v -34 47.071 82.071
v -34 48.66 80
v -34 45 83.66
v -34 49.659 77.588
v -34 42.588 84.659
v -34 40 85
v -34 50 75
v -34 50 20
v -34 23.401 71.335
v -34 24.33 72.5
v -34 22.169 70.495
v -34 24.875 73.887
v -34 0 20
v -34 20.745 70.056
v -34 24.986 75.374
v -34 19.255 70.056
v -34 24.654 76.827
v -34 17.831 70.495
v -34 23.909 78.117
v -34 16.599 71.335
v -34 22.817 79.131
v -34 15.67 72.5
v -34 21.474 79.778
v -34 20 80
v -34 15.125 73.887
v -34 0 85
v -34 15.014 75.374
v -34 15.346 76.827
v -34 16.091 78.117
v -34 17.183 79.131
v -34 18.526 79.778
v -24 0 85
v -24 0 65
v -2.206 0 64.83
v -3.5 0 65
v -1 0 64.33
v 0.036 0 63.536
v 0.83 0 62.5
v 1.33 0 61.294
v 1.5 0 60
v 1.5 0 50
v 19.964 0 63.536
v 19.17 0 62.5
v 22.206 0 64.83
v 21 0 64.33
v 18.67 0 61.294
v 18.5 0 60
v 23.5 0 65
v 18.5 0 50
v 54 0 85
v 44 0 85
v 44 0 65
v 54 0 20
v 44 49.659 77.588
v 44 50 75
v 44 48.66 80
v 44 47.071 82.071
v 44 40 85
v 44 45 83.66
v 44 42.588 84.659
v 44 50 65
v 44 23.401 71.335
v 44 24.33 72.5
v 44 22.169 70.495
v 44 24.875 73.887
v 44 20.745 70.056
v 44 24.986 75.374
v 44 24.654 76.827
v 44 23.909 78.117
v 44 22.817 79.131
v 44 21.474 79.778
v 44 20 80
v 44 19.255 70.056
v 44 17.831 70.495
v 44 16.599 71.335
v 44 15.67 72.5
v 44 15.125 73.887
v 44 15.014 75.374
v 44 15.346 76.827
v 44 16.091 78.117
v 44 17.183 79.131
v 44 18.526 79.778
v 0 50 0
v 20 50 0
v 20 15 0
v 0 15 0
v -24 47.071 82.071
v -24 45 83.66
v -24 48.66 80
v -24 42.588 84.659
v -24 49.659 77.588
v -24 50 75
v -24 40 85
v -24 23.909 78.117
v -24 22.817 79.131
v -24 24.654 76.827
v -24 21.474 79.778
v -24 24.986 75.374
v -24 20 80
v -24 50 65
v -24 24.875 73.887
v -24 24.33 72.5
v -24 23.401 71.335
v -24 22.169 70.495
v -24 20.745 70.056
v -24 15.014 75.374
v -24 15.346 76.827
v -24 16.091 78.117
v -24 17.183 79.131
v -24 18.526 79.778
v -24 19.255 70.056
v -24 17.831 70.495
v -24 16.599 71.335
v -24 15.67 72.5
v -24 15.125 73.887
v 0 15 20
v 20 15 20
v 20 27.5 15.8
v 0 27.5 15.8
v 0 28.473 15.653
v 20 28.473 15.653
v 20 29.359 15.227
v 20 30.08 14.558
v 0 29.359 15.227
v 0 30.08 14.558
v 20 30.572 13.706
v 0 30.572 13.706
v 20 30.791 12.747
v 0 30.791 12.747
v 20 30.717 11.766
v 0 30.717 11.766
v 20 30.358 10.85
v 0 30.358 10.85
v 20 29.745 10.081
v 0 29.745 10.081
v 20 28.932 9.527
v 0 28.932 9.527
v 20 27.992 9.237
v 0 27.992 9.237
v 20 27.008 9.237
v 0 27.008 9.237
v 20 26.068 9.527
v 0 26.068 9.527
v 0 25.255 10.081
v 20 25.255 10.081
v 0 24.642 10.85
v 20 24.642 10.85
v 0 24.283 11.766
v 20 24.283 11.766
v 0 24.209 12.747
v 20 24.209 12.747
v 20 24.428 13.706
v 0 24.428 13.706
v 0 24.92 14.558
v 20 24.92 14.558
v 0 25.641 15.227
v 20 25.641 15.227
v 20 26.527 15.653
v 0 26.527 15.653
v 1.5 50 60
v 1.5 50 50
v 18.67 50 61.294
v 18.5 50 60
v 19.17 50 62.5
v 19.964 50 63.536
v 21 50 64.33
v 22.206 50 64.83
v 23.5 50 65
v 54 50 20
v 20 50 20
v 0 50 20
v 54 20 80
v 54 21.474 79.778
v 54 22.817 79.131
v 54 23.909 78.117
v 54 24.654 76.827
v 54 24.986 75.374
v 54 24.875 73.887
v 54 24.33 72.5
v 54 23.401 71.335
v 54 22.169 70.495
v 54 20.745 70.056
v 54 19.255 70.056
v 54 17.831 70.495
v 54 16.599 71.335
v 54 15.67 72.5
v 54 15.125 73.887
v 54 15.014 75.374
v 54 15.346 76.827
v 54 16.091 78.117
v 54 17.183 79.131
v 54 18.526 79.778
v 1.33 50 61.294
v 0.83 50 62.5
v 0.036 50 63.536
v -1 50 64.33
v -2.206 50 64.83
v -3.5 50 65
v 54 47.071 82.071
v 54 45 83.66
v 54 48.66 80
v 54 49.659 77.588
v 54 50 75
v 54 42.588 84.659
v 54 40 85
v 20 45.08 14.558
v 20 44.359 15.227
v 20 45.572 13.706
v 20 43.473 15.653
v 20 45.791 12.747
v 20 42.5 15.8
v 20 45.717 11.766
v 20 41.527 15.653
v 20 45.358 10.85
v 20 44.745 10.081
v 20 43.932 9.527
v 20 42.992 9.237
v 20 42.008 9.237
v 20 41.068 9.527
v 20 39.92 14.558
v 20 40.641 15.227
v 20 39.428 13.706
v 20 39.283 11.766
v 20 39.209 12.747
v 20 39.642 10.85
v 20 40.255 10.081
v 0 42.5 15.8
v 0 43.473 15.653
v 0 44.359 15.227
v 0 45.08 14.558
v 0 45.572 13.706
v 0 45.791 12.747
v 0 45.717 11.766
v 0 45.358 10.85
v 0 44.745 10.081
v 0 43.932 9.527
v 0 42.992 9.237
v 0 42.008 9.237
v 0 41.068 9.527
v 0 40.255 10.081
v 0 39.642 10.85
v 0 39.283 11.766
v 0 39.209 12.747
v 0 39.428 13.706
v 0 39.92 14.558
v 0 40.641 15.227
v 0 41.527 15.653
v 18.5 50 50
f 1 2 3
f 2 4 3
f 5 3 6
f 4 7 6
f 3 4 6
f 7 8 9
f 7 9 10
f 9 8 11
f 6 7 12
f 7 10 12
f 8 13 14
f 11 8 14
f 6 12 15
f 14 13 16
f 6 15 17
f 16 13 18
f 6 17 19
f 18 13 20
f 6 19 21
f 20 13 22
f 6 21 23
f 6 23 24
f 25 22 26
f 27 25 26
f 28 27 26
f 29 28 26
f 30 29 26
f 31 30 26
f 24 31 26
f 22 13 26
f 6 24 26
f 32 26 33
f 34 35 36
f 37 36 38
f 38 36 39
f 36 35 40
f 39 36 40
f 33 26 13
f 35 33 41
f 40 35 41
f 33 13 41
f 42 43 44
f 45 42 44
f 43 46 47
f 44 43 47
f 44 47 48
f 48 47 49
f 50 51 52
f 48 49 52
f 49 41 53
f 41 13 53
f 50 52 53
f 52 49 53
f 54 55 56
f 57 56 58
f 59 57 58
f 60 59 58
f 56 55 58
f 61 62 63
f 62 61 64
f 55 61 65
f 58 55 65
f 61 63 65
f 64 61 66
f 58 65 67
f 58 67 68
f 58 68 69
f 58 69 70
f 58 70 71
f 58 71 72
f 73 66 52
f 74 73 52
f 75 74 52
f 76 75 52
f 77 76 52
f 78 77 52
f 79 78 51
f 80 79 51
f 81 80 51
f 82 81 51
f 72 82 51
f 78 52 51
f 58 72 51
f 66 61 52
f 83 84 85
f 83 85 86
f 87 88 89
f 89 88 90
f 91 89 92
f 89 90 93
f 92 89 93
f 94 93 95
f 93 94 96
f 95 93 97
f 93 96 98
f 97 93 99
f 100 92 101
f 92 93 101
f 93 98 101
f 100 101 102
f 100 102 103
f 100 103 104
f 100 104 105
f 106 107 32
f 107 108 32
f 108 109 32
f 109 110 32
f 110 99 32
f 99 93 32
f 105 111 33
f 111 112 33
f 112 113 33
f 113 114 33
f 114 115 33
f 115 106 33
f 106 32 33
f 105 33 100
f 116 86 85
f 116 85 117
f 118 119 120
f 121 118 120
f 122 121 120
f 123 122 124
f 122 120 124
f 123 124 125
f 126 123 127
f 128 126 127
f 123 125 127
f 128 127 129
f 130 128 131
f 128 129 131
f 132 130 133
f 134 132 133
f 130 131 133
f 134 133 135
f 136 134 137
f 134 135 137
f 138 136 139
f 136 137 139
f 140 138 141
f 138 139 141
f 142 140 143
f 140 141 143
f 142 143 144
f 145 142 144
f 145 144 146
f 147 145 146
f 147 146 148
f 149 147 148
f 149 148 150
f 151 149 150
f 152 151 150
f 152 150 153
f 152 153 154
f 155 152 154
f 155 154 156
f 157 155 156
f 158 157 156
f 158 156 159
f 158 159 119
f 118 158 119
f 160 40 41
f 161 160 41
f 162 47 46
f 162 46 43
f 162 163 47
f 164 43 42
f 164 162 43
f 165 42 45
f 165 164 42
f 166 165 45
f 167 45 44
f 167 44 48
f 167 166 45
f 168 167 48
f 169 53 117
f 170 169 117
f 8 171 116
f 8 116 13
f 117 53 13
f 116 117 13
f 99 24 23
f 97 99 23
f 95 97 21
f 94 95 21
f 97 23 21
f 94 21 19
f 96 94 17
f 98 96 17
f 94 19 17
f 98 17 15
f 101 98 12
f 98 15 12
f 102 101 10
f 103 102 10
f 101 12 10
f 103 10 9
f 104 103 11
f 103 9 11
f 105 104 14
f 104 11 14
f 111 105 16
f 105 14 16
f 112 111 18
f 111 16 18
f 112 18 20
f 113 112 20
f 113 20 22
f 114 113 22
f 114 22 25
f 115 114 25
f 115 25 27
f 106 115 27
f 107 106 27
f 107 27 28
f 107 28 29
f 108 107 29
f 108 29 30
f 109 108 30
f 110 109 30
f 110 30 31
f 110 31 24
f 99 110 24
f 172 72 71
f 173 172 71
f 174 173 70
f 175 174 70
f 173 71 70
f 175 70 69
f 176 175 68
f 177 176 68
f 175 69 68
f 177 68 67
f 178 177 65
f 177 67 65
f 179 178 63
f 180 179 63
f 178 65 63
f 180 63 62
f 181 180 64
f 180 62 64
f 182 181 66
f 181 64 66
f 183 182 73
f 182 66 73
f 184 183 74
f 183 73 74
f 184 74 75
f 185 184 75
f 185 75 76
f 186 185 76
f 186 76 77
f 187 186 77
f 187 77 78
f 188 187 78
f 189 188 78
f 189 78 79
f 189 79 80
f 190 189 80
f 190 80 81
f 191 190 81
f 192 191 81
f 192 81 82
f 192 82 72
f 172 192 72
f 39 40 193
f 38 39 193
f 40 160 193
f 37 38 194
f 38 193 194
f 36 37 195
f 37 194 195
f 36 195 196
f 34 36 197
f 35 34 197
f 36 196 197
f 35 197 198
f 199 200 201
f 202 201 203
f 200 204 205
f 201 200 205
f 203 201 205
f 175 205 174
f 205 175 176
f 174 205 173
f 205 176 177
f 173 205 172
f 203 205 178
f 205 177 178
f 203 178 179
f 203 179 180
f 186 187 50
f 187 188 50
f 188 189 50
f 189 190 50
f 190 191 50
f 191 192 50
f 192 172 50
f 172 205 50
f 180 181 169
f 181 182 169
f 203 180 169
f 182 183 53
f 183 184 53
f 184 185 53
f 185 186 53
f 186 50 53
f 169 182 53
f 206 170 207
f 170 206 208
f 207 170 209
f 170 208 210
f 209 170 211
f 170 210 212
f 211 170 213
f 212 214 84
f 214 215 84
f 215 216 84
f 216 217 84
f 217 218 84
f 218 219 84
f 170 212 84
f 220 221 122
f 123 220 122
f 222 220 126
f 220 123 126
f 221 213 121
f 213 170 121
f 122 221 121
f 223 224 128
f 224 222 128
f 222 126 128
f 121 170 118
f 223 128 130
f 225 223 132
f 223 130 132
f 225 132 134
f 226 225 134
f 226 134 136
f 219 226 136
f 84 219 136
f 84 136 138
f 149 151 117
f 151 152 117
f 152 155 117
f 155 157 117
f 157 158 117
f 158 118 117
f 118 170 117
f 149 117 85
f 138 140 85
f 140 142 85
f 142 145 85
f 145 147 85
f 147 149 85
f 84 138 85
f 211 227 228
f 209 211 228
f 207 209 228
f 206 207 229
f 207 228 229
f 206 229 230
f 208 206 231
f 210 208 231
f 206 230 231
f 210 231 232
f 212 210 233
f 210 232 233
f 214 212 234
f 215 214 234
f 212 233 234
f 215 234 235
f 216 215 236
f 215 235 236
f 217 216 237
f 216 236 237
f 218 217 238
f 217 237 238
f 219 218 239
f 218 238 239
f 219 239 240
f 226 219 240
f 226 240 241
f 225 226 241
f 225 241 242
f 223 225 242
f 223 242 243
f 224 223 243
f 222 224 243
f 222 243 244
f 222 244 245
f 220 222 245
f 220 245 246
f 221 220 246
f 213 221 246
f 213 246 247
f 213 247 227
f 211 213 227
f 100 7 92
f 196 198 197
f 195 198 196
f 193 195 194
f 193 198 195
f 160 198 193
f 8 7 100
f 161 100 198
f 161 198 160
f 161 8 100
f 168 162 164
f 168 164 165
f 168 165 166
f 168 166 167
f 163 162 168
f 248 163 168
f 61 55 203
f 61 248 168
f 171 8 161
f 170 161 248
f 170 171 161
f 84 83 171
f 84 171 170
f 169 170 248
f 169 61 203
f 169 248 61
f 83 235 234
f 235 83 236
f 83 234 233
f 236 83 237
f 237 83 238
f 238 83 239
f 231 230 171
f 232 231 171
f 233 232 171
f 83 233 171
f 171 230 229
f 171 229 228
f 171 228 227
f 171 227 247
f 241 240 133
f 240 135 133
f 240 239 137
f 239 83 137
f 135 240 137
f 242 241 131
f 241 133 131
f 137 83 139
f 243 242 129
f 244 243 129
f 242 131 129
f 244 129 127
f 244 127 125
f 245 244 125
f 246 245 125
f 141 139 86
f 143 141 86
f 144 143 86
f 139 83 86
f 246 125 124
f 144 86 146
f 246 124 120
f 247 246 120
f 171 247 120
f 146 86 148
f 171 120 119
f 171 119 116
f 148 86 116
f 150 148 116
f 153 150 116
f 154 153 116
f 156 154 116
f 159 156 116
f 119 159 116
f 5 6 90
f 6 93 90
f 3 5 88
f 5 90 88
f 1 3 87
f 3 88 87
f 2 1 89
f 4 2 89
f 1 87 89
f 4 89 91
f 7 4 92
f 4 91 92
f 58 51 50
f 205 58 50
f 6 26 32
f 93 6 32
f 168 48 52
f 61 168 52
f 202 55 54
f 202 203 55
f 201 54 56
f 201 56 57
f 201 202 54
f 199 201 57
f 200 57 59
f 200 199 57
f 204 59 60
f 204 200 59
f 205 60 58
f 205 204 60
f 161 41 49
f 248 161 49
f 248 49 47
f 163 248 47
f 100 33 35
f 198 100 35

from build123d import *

# Parameters (mm, degrees)
BOSS_EXTRUDE2_DEPTH = 50
FILLET3_R           = 10
FILLET4_R           = 10
FILLET5_R           = 5
FILLET6_R           = 5
SKETCH3_W           = 20
SKETCH3_H           = 15
CUT_EXTRUDE2_DEPTH  = 37
SKETCH2_R           = 5
CUT_EXTRUDE3_DEPTH  = 115
CUT_EXTRUDE4_REACH  = 114.432
SKETCH4_R           = 3.3


with BuildPart() as part:
    # Sketch1 → Boss-Extrude2 (new body)
    with BuildSketch(Plane(origin=(0, 0, 0), x_dir=(1, 0, 0), z_dir=(0, 1, 0))):
        Polygon((20, 0), (0, 0), (0, -20), (-34, -20), (-34, -85), (-24, -85), (-24, -65), (1.5, -65), (1.5, -50), (18.5, -50), (18.5, -65), (44, -65), (44, -85), (54, -85), (54, -20), (20, -20), align=None)
    extrude(amount=BOSS_EXTRUDE2_DEPTH)

    # Fillet3
    fillet3_edges = [part.edges().sort_by_distance(p)[0] for p in [
        (-29, 50, 85),
    ]]
    fillet(fillet3_edges, radius=FILLET3_R)

    # Fillet4
    fillet4_edges = [part.edges().sort_by_distance(p)[0] for p in [
        (49, 50, 85),
    ]]
    fillet(fillet4_edges, radius=FILLET4_R)

    # Fillet5
    fillet5_edges = [part.edges().sort_by_distance(p)[0] for p in [
        (1.5, 25, 65),
    ]]
    fillet(fillet5_edges, radius=FILLET5_R)

    # Fillet6
    fillet6_edges = [part.edges().sort_by_distance(p)[0] for p in [
        (18.5, 25, 65),
    ]]
    fillet(fillet6_edges, radius=FILLET6_R)

    # Sketch3 → Cut-Extrude2 (cut)
    with BuildSketch(Plane.ZY):
        with Locations((10, 7.5)):
            Rectangle(SKETCH3_W, SKETCH3_H)
    extrude(amount=-CUT_EXTRUDE2_DEPTH, mode=Mode.SUBTRACT)

    # Sketch2 → Cut-Extrude3 (cut)
    with BuildSketch(Plane.ZY.offset(34)):
        with Locations((75, 20)):
            Circle(SKETCH2_R)
    extrude(amount=-CUT_EXTRUDE3_DEPTH, mode=Mode.SUBTRACT)

    # Sketch4 → Cut-Extrude4 (cut, up to next)
    with BuildSketch(Plane.ZY, mode=Mode.PRIVATE) as cut_extrude4_sk1:
        with Locations((12.5, 42.5)):
            Circle(SKETCH4_R)
    cut_extrude4_tool1 = extrude(cut_extrude4_sk1.sketch, amount=-CUT_EXTRUDE4_REACH, mode=Mode.PRIVATE) & part.part
    # Sketch4 → Cut-Extrude4 (cut, up to next)
    with BuildSketch(Plane.ZY, mode=Mode.PRIVATE) as cut_extrude4_sk2:
        with Locations((12.5, 27.5)):
            Circle(SKETCH4_R)
    cut_extrude4_tool2 = extrude(cut_extrude4_sk2.sketch, amount=-CUT_EXTRUDE4_REACH, mode=Mode.PRIVATE) & part.part
    add(cut_extrude4_tool1.solids().sort_by_distance((0, 42.5, 12.5))[0], mode=Mode.SUBTRACT)
    add(cut_extrude4_tool2.solids().sort_by_distance((0, 27.5, 12.5))[0], mode=Mode.SUBTRACT)


solid = part.part
